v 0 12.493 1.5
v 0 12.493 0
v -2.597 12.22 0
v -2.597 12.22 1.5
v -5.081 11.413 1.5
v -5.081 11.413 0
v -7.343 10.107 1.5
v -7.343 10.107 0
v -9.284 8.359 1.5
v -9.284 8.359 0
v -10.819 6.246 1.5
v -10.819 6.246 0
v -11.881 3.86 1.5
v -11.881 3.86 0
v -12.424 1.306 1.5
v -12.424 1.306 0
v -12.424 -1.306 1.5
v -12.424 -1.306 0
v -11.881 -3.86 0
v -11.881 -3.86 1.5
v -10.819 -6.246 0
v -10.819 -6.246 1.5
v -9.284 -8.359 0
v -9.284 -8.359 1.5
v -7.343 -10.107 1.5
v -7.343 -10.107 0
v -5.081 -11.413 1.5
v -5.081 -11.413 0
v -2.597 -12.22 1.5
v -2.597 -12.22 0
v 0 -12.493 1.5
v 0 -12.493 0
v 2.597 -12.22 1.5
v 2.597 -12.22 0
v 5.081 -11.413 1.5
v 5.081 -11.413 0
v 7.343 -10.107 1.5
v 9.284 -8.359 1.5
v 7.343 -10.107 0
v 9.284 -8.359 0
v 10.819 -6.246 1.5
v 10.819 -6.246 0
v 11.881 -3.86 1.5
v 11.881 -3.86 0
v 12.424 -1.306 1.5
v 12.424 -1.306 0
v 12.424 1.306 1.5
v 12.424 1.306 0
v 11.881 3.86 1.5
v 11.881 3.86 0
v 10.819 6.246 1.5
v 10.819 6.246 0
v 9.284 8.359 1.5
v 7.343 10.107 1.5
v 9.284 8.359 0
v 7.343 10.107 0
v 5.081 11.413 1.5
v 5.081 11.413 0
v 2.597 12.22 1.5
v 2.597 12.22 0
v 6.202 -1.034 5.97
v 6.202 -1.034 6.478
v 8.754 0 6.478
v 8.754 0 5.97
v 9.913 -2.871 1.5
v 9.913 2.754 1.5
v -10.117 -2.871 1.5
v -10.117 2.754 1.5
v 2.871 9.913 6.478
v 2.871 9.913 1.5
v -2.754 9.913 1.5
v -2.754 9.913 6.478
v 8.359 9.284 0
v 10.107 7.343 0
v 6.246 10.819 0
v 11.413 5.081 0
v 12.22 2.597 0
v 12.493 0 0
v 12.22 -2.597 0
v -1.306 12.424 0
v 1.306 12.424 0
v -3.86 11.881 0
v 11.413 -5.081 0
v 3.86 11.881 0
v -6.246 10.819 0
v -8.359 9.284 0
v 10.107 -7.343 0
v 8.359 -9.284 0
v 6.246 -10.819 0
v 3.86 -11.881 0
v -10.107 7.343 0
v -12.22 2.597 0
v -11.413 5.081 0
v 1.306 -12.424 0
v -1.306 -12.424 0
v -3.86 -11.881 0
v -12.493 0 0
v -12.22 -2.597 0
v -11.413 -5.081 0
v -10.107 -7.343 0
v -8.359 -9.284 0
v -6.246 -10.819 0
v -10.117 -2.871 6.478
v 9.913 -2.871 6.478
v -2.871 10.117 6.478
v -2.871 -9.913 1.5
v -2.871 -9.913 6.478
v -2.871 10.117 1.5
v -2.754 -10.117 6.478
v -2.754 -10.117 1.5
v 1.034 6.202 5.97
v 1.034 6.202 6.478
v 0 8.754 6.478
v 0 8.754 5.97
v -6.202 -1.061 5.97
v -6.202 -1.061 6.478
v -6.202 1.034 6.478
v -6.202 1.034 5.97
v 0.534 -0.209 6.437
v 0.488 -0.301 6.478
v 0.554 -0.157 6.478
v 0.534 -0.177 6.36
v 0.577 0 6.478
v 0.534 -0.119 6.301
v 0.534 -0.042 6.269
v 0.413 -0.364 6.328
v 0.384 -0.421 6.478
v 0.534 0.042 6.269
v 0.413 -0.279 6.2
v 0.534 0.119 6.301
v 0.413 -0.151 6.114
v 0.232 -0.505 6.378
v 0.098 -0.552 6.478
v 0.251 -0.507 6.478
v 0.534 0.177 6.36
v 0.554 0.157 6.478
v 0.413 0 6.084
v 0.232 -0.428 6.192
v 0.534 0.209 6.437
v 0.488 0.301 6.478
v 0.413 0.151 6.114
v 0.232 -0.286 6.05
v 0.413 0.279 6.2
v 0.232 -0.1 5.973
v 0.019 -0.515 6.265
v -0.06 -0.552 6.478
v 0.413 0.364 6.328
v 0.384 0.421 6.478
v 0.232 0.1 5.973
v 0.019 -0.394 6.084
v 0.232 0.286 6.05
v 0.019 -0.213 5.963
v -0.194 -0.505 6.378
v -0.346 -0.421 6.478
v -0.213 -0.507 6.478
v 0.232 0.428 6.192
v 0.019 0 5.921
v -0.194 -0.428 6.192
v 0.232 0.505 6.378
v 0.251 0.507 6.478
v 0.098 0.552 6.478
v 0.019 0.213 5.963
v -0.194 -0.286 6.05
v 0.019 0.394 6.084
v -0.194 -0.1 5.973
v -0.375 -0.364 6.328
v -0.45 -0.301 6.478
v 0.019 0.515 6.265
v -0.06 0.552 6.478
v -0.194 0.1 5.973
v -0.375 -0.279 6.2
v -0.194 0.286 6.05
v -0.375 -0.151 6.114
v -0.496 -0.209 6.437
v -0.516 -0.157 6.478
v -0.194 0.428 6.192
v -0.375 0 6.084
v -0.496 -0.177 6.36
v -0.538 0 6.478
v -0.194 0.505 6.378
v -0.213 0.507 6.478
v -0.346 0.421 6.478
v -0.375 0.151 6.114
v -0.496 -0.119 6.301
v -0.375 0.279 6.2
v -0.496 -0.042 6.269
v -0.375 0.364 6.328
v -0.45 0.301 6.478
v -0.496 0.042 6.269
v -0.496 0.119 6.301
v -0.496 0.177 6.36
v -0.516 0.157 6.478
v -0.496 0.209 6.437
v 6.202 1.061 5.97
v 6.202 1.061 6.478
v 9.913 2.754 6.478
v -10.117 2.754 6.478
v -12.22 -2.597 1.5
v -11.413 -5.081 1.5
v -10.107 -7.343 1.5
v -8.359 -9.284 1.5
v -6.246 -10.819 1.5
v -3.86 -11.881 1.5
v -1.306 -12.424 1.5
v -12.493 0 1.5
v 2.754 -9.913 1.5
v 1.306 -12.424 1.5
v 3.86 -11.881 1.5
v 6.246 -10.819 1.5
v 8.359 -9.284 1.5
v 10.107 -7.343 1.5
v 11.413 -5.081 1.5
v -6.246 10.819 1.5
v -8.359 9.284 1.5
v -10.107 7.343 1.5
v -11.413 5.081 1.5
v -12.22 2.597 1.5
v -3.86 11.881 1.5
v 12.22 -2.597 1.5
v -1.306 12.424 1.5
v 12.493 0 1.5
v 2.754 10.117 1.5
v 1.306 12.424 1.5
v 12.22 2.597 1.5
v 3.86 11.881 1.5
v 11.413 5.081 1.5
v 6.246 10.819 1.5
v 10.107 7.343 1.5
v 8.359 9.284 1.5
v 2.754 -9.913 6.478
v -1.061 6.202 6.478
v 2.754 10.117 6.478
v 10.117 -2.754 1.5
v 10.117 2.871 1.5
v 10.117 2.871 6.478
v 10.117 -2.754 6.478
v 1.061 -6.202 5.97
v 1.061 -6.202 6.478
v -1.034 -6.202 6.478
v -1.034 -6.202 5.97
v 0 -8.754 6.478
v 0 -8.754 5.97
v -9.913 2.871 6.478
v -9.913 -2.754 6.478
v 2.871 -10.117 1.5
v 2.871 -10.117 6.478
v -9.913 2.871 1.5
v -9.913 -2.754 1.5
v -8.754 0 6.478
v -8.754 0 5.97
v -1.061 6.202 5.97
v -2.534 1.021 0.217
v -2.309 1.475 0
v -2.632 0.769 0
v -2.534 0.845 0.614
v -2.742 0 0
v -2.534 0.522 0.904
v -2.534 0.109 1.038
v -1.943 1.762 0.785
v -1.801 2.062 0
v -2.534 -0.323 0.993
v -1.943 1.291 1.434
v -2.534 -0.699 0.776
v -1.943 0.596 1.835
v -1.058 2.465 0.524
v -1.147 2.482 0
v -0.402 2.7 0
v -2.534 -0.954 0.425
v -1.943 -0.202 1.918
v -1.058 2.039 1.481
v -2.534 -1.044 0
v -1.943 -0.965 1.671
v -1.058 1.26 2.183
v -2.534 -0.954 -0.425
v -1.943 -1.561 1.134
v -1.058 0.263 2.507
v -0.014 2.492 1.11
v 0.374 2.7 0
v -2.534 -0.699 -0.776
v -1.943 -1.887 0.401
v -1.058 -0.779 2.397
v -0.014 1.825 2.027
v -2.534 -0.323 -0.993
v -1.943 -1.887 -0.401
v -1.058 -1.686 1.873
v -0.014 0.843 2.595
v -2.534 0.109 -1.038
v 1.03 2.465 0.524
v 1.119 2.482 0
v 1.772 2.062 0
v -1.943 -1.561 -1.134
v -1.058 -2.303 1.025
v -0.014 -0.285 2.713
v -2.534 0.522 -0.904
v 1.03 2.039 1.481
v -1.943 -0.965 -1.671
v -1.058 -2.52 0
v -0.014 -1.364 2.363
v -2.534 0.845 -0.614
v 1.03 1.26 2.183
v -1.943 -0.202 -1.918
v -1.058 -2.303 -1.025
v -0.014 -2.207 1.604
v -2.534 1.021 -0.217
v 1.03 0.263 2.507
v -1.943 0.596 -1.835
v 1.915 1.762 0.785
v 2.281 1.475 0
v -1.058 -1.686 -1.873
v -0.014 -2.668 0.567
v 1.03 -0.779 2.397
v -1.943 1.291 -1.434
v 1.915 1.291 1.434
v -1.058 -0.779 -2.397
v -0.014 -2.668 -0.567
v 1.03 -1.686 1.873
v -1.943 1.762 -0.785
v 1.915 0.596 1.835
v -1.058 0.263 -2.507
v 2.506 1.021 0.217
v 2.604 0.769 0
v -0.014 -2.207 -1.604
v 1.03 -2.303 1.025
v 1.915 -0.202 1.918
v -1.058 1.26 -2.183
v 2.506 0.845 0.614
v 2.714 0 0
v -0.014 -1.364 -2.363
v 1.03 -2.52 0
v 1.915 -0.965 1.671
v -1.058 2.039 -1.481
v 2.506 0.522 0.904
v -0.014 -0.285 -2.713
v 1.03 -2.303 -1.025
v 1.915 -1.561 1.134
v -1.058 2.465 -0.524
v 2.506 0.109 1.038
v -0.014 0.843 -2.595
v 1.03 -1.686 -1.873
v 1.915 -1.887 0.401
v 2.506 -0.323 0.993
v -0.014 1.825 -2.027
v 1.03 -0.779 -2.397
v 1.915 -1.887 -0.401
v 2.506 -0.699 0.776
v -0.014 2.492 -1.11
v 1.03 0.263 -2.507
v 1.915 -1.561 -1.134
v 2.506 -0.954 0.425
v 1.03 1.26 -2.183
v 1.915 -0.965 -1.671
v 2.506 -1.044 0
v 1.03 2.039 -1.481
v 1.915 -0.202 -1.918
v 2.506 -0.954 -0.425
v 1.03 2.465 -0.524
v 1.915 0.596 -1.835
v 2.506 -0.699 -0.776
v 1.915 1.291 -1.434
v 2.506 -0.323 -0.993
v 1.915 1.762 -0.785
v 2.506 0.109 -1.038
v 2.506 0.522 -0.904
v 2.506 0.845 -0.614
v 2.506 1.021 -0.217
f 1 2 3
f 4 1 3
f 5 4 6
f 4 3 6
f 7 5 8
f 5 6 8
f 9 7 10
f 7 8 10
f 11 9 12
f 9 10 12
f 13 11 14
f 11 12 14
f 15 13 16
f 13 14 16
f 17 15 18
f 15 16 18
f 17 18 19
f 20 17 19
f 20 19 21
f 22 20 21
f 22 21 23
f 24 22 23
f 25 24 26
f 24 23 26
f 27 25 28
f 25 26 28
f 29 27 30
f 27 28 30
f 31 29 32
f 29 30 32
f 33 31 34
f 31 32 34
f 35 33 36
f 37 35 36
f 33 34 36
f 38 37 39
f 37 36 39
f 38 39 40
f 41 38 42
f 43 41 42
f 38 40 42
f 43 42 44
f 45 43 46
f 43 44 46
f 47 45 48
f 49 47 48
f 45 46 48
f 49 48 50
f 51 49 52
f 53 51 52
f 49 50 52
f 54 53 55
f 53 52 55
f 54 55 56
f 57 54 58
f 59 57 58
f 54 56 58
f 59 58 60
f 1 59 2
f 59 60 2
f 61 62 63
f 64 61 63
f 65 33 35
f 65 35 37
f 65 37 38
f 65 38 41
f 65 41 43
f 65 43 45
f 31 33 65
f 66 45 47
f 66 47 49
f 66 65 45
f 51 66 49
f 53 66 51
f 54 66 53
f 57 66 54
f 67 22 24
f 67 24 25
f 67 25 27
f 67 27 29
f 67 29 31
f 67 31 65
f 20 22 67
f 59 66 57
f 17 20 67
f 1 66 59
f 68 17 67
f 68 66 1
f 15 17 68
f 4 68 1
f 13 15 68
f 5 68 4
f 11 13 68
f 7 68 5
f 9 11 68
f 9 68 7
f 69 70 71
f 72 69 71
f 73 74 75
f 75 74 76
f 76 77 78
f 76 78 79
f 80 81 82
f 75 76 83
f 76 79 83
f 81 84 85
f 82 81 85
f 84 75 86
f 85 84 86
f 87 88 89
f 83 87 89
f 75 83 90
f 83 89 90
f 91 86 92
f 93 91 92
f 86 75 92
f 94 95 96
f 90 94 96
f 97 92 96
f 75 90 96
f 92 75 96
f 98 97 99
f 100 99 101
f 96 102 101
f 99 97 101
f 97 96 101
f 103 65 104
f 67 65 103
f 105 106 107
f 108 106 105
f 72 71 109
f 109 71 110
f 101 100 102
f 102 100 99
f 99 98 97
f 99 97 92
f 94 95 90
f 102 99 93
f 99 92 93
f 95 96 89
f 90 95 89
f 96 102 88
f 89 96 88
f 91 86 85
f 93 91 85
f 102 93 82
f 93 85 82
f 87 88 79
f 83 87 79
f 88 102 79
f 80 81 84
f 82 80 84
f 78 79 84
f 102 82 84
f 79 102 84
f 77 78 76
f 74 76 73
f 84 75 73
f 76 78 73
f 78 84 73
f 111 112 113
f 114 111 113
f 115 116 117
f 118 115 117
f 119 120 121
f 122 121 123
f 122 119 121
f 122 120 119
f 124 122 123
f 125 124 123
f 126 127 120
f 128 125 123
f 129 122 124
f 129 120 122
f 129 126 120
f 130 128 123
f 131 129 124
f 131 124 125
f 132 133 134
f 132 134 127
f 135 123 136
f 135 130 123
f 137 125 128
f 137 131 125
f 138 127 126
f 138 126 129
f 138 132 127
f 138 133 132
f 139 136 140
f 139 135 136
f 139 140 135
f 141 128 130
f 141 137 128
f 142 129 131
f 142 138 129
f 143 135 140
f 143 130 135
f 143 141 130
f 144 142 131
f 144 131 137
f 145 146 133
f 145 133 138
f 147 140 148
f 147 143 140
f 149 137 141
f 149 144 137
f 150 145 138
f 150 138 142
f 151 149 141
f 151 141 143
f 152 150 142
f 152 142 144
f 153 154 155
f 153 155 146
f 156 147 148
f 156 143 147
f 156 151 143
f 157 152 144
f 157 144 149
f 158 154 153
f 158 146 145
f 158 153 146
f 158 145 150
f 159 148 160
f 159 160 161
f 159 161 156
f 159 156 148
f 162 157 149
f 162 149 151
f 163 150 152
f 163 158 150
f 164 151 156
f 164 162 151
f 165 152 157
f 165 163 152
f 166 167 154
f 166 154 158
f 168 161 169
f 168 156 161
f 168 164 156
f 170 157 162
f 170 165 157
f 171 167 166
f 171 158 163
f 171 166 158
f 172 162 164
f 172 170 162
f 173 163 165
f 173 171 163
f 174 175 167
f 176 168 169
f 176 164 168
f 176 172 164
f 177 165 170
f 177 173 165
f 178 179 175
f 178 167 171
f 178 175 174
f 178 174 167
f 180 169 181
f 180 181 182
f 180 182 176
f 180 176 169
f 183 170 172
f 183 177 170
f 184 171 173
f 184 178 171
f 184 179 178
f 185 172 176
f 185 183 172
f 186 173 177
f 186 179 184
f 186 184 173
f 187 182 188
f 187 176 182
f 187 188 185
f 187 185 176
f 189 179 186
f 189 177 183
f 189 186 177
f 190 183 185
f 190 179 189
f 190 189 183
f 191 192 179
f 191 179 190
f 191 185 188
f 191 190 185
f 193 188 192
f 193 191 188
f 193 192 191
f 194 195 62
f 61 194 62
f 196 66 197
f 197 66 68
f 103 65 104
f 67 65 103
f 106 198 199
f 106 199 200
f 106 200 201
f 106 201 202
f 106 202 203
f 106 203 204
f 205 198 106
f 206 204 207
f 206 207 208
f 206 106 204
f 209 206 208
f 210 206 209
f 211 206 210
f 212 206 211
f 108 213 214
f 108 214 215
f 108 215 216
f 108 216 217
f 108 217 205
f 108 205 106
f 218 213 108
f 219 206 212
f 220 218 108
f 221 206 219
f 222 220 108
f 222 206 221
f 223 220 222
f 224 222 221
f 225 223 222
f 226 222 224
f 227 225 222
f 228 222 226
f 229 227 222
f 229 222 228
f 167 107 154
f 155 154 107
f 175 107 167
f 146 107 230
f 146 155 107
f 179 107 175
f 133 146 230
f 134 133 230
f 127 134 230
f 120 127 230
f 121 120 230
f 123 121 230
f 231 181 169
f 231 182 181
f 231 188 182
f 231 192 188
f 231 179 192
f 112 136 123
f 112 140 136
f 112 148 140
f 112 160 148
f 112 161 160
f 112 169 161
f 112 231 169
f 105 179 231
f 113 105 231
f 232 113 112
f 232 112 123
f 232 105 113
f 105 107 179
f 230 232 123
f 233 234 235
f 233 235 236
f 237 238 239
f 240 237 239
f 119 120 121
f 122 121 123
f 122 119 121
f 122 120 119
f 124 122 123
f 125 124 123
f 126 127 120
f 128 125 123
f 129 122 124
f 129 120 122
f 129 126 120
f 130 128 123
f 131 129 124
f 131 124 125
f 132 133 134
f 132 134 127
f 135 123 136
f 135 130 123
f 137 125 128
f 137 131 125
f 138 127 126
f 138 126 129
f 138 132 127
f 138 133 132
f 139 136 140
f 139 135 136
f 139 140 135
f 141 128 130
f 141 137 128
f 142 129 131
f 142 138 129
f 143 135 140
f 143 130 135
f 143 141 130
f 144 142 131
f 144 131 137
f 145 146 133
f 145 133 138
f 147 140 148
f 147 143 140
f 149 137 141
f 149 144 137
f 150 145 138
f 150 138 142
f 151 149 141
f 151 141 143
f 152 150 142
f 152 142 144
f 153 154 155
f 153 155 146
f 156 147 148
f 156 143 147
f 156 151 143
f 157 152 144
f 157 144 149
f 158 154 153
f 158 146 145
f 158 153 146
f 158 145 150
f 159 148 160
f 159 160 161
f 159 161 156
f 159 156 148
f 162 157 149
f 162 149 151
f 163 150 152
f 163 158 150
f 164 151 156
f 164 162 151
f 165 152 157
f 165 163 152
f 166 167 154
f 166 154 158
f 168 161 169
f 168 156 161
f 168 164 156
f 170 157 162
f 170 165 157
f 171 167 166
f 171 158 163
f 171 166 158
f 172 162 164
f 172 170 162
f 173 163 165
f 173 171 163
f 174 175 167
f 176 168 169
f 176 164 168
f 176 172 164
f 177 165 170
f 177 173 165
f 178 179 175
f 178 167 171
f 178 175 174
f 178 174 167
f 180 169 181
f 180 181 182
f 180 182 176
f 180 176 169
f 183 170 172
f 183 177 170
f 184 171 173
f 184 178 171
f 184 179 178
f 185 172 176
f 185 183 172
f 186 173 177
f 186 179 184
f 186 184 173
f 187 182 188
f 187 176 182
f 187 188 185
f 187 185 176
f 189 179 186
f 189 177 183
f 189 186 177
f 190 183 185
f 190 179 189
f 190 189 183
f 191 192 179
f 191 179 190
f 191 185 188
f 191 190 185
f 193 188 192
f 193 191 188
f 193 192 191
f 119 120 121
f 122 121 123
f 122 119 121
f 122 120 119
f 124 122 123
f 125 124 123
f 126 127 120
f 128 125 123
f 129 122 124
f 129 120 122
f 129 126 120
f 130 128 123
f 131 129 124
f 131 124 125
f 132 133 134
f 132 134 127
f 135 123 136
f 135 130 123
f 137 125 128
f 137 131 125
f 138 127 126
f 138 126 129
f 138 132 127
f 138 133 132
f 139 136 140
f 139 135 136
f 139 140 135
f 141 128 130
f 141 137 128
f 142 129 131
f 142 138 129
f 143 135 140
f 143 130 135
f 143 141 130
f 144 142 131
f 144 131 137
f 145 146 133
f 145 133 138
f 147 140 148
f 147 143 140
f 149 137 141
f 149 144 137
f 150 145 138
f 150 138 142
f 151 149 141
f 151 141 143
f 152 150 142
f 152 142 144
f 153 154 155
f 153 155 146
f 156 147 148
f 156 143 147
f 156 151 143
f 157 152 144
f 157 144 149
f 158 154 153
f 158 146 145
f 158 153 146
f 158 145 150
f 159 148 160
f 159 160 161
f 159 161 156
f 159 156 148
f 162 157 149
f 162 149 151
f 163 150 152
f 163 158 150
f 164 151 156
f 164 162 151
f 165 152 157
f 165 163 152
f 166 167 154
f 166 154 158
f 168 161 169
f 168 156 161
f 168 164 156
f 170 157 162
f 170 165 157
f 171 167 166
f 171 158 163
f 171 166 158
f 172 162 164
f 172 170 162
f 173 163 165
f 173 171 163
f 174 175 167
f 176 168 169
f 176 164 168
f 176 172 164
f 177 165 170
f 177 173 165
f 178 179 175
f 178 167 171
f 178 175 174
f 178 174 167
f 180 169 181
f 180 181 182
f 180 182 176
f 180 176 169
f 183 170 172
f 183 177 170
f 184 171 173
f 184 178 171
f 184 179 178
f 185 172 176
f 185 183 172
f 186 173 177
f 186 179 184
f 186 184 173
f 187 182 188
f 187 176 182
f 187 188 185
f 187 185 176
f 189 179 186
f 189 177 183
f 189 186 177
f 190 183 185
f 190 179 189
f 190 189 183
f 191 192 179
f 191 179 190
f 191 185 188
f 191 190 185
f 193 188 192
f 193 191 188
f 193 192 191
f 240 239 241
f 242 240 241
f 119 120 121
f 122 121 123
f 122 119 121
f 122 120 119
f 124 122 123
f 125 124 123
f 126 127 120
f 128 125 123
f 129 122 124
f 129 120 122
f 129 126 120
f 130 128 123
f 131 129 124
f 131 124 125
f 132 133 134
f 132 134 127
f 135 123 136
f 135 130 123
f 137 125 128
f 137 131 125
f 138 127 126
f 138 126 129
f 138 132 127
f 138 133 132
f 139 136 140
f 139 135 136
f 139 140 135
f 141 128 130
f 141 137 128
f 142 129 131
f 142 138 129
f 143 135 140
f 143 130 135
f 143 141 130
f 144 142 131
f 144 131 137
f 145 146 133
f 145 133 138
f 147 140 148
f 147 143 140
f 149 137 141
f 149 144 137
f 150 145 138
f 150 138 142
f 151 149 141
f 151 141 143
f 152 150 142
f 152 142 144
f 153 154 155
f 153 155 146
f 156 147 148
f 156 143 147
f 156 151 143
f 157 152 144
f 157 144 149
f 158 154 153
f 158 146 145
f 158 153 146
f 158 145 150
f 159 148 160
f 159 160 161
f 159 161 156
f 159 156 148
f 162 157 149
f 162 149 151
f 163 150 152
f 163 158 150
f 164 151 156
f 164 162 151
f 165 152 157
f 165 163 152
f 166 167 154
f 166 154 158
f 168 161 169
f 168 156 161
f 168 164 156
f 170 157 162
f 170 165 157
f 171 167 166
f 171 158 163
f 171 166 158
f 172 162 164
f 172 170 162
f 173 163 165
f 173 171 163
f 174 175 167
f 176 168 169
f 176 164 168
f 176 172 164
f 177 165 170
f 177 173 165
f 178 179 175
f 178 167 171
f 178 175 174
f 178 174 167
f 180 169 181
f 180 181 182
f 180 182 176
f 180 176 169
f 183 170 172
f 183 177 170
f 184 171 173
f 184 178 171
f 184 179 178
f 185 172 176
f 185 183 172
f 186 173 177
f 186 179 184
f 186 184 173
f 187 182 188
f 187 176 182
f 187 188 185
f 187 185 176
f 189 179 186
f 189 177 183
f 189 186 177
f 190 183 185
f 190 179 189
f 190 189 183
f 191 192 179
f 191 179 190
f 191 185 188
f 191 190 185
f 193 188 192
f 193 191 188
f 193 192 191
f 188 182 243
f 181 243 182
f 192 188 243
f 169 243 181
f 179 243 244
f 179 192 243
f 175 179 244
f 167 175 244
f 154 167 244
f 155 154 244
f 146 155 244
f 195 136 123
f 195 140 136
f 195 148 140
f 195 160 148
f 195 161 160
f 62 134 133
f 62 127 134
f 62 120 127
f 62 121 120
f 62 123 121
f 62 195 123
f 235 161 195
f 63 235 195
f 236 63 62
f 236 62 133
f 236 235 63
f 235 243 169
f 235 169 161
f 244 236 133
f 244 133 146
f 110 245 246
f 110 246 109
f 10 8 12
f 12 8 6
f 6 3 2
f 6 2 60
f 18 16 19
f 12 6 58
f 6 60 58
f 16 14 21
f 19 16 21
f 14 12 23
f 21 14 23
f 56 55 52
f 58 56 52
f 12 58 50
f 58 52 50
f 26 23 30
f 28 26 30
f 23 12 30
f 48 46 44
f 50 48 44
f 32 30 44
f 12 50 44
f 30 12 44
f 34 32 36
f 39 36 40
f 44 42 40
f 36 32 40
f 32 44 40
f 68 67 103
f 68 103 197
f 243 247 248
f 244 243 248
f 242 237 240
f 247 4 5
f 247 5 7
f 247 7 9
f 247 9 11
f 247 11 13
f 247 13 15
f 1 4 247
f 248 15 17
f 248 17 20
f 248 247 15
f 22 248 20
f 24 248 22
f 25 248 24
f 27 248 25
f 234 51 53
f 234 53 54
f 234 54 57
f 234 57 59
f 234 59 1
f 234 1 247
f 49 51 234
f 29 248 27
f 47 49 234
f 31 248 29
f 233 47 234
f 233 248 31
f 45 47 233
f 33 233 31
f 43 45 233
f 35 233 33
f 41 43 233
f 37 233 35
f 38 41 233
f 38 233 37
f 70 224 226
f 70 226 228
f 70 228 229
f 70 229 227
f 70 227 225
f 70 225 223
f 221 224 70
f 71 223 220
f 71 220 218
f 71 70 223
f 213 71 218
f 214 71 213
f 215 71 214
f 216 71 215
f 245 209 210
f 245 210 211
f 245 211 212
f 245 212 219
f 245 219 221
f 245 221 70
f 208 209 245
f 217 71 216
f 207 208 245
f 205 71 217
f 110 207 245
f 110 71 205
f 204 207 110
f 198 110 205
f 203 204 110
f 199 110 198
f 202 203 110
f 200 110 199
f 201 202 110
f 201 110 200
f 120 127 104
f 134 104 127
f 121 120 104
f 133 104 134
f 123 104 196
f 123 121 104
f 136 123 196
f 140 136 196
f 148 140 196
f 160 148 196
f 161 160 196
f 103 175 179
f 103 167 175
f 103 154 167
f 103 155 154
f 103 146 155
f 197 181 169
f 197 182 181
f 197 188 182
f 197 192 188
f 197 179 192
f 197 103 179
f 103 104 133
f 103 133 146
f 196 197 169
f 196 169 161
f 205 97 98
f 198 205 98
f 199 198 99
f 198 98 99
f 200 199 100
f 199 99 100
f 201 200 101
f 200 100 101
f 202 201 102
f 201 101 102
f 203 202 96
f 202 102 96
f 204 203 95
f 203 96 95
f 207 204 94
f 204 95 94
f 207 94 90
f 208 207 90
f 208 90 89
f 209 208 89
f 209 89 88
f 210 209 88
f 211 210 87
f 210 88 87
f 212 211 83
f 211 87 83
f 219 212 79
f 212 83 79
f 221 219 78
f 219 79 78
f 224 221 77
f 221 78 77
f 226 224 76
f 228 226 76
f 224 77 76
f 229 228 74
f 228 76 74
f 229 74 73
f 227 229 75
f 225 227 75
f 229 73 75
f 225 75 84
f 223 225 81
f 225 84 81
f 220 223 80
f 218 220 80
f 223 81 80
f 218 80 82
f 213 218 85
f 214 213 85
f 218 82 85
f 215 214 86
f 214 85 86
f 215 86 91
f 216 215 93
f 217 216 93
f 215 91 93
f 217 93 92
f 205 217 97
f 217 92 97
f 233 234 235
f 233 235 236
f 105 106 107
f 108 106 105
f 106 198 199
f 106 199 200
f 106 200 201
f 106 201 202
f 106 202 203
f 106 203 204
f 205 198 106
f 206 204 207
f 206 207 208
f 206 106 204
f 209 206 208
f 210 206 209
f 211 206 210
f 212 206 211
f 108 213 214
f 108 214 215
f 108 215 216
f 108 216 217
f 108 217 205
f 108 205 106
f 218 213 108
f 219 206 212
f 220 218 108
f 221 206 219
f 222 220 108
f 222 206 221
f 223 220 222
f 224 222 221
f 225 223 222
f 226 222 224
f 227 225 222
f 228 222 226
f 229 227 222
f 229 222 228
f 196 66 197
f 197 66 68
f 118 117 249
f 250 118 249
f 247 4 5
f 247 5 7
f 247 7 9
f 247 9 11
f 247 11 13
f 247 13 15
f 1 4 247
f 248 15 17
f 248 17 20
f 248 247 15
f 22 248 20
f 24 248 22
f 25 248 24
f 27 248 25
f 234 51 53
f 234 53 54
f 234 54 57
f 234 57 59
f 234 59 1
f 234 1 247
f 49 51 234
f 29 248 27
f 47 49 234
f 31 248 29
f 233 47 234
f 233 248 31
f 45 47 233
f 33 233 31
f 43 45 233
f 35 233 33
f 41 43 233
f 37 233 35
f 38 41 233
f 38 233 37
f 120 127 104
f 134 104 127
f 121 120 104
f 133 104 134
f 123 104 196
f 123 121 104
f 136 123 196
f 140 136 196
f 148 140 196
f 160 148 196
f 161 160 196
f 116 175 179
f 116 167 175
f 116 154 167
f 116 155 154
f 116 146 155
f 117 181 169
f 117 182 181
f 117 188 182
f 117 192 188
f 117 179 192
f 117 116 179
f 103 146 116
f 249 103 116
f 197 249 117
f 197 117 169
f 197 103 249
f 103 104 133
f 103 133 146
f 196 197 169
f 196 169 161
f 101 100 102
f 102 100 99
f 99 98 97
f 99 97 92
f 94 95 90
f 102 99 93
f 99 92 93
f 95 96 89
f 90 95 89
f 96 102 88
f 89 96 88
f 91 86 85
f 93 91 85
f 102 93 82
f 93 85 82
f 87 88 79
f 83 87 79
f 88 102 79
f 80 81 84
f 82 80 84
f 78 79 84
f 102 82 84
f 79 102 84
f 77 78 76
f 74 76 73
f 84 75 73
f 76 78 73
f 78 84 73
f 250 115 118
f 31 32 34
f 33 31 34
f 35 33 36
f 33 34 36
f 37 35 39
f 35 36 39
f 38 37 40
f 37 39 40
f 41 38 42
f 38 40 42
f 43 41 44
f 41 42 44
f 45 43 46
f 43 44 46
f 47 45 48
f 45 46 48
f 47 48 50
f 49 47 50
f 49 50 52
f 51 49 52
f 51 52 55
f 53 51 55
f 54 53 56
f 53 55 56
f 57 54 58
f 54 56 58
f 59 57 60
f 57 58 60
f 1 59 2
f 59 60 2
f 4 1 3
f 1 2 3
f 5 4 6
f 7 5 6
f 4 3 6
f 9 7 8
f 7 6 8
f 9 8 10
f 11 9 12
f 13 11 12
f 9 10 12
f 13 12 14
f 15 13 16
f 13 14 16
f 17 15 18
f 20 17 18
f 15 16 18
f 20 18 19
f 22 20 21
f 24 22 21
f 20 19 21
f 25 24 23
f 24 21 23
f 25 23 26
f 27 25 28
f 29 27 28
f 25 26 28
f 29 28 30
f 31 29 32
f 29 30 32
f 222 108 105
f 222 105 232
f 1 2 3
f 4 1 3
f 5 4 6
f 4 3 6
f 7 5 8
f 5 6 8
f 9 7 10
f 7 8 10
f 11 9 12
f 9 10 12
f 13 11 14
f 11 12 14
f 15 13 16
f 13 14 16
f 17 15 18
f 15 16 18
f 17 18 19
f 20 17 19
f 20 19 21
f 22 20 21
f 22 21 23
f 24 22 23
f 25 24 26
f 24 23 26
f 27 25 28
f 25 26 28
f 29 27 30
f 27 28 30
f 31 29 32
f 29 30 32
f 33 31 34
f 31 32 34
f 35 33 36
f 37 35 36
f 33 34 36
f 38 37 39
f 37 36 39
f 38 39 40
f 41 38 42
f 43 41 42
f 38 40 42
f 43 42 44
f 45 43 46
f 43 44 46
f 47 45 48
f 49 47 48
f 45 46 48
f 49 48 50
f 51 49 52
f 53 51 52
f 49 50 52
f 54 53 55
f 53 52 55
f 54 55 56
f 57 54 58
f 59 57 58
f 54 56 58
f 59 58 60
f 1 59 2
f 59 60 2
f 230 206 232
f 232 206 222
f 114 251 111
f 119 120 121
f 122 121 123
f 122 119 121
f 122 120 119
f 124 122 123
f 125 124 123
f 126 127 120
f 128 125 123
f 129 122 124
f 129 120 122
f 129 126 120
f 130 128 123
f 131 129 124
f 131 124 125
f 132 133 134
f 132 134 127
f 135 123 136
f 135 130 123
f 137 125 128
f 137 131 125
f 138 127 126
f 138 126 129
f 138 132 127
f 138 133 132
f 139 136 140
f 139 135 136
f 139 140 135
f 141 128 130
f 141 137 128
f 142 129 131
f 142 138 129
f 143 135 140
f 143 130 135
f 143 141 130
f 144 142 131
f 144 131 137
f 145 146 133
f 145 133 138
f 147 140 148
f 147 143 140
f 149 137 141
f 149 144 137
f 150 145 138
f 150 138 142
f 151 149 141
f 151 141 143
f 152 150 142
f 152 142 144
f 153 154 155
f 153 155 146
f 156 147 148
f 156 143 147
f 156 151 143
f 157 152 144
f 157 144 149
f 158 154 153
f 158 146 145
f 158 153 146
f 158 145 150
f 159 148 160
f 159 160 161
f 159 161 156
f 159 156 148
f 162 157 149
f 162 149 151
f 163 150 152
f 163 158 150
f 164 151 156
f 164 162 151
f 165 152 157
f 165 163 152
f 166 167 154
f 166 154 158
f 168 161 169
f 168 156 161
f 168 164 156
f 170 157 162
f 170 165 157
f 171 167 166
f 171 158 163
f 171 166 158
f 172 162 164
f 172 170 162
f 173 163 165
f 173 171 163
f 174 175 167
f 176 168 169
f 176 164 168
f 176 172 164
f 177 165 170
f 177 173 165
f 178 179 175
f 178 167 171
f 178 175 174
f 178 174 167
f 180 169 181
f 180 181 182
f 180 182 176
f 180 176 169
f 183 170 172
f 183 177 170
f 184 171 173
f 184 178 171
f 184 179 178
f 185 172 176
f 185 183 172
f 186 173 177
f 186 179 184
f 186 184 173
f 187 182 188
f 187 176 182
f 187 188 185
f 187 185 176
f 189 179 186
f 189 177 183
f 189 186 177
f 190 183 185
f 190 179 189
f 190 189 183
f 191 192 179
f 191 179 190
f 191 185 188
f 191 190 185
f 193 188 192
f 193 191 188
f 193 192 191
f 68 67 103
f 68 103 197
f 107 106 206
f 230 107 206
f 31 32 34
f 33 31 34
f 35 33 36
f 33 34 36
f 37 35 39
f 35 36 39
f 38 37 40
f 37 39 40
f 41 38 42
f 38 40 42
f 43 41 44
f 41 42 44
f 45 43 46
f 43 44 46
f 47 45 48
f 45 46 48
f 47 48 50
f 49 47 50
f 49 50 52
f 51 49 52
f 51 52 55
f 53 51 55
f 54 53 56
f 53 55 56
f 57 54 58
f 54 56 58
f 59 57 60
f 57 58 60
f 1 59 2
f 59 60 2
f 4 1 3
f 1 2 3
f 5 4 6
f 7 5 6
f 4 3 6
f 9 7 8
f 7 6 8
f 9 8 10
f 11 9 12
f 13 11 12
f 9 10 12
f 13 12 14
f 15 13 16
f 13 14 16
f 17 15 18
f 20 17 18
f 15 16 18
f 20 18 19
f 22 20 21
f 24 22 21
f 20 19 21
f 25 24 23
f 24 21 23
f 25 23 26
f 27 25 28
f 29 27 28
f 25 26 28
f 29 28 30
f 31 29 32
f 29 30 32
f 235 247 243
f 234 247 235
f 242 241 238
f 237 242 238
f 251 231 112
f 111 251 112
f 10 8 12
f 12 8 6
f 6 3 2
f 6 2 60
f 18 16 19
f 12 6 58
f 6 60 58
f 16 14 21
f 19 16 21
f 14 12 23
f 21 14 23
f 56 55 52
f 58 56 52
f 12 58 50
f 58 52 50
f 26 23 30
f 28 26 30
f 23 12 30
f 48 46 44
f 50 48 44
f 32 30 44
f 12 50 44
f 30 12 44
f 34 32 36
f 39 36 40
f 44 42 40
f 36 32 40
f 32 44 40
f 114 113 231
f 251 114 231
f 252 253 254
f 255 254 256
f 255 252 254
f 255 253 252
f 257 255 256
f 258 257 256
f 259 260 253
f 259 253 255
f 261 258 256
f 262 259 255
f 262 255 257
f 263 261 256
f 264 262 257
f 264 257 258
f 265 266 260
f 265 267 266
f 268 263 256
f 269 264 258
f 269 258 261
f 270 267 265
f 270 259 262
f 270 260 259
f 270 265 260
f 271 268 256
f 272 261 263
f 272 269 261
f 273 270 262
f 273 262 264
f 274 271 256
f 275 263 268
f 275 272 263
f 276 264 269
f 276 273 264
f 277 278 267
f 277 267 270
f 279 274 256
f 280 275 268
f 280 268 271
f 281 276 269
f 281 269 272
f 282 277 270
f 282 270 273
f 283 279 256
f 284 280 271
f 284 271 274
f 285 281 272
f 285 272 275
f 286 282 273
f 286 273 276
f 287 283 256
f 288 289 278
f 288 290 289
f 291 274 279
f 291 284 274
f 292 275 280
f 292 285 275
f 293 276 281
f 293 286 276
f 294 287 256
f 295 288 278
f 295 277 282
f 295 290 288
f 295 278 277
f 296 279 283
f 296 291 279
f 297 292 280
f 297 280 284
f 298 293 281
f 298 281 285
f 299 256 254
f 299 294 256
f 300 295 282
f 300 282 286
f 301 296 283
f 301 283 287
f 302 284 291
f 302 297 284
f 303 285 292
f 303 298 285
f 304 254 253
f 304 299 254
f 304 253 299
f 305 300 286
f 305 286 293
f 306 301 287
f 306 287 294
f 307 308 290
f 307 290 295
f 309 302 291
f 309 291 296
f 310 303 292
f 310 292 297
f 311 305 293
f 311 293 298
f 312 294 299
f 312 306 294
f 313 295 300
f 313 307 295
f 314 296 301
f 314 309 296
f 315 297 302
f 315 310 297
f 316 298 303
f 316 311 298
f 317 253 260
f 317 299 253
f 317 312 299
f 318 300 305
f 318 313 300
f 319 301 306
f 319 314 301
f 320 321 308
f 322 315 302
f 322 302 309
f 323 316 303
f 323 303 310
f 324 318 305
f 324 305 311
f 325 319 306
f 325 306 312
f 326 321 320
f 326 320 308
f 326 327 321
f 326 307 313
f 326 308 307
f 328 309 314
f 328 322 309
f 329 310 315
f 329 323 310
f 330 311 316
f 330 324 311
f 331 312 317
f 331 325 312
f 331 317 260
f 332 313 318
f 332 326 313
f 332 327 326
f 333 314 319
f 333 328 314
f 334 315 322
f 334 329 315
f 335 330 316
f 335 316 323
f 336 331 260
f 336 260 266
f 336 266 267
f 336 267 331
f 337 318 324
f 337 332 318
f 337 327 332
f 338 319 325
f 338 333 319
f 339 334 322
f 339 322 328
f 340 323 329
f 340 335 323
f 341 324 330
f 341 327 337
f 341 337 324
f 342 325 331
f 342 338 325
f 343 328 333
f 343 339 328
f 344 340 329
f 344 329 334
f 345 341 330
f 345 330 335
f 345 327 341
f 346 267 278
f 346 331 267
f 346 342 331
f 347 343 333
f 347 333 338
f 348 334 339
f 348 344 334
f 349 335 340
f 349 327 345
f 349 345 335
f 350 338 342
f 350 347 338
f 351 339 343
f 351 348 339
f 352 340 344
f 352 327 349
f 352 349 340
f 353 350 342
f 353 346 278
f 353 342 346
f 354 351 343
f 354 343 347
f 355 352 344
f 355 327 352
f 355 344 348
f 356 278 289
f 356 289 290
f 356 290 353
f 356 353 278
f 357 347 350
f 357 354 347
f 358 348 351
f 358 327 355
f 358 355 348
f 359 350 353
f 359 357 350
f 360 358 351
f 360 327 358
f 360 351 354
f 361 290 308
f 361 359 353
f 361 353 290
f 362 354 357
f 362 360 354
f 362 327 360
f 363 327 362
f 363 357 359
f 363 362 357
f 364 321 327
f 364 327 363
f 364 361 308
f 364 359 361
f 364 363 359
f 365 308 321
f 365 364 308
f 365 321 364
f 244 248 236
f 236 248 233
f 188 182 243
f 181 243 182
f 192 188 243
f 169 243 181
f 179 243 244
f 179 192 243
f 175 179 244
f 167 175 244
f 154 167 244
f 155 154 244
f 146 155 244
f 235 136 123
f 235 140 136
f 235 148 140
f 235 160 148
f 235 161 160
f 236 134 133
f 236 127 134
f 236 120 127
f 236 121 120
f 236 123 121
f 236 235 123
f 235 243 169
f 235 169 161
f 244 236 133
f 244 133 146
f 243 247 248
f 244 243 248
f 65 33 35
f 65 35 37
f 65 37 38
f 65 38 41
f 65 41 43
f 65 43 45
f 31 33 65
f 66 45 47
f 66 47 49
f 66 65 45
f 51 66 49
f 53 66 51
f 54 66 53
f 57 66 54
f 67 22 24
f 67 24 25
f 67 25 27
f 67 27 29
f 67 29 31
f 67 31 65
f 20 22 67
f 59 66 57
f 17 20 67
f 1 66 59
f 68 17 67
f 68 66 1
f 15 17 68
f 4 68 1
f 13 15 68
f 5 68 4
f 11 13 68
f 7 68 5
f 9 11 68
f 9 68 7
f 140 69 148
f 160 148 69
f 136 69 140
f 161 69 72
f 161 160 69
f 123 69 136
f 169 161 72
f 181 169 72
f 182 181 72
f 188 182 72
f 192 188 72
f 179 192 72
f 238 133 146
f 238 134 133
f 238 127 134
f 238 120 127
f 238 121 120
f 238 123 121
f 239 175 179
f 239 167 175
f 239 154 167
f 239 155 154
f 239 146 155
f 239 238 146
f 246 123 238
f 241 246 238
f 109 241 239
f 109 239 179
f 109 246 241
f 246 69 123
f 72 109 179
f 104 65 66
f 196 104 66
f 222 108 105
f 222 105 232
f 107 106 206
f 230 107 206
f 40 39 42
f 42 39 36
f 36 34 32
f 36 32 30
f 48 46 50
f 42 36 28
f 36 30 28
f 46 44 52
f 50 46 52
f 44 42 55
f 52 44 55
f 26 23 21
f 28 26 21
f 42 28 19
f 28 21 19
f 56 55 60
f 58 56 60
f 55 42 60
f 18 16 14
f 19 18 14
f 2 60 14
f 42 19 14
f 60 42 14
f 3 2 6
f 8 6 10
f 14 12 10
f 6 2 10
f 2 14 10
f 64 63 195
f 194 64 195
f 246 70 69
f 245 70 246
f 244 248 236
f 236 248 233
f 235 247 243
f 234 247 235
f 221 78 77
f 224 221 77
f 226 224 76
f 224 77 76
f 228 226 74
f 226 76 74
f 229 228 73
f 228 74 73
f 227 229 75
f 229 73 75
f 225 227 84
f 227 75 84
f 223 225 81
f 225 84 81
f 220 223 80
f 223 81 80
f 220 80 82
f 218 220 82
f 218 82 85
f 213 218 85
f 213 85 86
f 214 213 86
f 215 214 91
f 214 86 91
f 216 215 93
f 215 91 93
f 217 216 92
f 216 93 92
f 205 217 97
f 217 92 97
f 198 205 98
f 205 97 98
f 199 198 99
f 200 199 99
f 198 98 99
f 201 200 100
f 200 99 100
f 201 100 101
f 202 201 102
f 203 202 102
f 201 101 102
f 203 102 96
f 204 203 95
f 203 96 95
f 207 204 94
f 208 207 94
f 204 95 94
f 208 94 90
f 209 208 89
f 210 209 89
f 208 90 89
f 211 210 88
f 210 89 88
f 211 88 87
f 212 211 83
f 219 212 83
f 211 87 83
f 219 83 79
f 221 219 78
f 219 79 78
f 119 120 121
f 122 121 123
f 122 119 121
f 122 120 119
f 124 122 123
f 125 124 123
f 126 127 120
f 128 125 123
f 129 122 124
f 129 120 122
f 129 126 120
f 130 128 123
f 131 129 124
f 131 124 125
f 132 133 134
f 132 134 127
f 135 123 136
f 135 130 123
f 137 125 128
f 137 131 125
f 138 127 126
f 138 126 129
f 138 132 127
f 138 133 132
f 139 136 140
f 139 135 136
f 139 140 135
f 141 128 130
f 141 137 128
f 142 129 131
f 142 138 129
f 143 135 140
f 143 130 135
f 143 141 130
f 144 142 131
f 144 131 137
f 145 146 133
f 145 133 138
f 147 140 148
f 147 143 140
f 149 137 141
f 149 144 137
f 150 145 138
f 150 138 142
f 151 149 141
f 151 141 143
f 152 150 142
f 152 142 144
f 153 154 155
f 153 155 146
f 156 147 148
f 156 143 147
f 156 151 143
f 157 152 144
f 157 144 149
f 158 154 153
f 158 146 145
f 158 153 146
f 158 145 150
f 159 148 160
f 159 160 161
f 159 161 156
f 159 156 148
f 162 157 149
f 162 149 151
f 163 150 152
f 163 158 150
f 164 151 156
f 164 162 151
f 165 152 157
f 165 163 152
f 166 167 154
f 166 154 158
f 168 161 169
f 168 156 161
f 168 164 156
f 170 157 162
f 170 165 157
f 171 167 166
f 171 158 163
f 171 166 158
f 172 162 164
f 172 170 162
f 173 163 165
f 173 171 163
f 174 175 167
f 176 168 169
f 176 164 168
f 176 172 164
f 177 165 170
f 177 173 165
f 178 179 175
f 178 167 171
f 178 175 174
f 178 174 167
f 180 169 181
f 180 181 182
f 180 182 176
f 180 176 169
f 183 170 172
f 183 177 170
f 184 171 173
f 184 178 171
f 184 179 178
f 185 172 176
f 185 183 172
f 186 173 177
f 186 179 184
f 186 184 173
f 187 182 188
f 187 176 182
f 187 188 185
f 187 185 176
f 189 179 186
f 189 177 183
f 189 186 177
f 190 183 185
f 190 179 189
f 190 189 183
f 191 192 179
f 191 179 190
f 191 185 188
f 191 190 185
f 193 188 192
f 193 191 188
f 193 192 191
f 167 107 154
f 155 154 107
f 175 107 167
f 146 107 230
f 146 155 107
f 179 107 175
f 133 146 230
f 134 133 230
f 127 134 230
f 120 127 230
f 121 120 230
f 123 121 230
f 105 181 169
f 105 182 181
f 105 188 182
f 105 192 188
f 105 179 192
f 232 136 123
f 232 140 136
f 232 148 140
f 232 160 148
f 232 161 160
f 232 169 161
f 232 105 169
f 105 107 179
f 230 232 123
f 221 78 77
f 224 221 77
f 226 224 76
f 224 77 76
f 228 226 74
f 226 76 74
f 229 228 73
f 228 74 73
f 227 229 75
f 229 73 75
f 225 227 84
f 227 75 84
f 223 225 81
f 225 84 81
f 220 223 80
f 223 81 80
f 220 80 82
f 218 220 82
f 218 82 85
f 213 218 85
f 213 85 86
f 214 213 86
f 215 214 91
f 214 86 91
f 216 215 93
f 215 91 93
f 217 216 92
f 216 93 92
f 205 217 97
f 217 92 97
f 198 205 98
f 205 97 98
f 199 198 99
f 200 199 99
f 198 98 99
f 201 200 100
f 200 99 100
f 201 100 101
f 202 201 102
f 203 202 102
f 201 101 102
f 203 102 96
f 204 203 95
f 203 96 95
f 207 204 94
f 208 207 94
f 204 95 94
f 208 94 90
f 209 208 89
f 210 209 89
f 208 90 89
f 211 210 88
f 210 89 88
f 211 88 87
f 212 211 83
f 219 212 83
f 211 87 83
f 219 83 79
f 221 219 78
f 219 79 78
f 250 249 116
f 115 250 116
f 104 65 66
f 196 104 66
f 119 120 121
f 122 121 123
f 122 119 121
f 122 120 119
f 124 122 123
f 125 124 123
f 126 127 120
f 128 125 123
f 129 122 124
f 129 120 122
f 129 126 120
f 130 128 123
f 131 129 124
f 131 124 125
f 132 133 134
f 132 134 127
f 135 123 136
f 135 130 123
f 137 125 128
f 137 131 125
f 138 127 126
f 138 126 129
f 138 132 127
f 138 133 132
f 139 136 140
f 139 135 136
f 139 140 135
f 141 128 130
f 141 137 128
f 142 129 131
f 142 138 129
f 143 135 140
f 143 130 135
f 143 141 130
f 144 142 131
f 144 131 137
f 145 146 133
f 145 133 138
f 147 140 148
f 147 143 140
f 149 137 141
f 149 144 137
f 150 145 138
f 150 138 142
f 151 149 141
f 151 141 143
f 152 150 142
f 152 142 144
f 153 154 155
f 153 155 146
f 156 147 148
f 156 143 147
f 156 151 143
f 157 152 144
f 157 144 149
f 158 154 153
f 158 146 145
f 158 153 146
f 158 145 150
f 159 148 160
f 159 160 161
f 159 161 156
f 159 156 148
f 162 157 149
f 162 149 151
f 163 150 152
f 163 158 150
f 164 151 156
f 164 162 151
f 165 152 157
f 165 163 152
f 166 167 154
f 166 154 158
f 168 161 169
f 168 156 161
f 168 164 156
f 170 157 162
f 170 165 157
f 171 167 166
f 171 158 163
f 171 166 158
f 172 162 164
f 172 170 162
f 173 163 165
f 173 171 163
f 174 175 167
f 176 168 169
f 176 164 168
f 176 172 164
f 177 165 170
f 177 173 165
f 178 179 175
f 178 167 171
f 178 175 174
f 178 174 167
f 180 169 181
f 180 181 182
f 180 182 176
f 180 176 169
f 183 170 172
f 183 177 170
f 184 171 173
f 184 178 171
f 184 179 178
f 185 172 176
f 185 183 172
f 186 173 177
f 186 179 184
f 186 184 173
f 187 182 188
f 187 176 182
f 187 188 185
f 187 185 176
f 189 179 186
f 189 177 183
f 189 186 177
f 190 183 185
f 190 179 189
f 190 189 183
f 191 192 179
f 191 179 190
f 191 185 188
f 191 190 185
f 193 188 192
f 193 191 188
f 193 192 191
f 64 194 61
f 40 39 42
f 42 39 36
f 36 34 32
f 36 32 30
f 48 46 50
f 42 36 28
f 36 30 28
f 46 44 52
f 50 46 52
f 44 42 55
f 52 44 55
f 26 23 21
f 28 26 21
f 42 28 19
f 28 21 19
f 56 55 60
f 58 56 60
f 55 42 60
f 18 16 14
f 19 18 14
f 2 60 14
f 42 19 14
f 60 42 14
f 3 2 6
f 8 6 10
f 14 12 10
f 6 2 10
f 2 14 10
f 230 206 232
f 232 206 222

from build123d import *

# Parameters (mm, degrees)
F0_R     = 12.4925376122
F1_DEPTH = 1.49999954
F2_W     = 5.6254547089
F2_H     = 20.0294479728
F3_DEPTH = 4.9784
F4_ANGLE = 90
F6_DEPTH = 0.508
F7_ANGLE = 90
F8_ANGLE = 180
F9_ANGLE = 270


with BuildPart() as f1:
    # F0 (on Top) → F1 (new body)
    with BuildSketch(Plane.XY):
        Circle(F0_R)
    extrude(amount=F1_DEPTH)

    # F2 (on face) → F3 (join)
    with BuildSketch(Plane.XY.offset(1.49999954)):
        with Locations((-0.0586905517, 0.1018550247)):
            Rectangle(F2_W, F2_H)
    extrude(amount=F3_DEPTH)


with BuildPart() as f4_1:
    # F4: copy of F1
    add(f1.part.rotate(Axis((0, 0, 1.49999954), (0, 0, 1)), F4_ANGLE))


with BuildPart() as f1_1:
    add(f1.part)

    # F5 (on face) → F6 (cut)
    with BuildSketch(Plane.XY.offset(6.47839954)):
        Polygon((1.0343084128, 6.2022455968), (0, 8.7543390691), (-1.060815071, 6.2022455968), align=None)
    extrude(amount=-F6_DEPTH, mode=Mode.SUBTRACT)


with BuildPart() as f7_1:
    # F7: copy of F1
    add(f1_1.part.rotate(Axis((0, 0, 1.49999954), (0, 0, 1)), F7_ANGLE))


with BuildPart() as f8_1:
    # F8: copy of F1
    add(f1_1.part.rotate(Axis((0, 0, 1.49999954), (0, 0, 1)), F8_ANGLE))


with BuildPart() as f8_2:
    # F8: copy of F4_1
    add(f4_1.part.rotate(Axis((0, 0, 1.49999954), (0, 0, 1)), F8_ANGLE))


with BuildPart() as f9_1:
    # F9: copy of F4_1
    add(f4_1.part.rotate(Axis((0, 0, 1.49999954), (0, 0, 1)), F9_ANGLE))


with BuildPart() as f9_2:
    # F9: copy of F1
    add(f1_1.part.rotate(Axis((0, 0, 1.49999954), (0, 0, 1)), F9_ANGLE))


with BuildPart() as f11:
    # F10 (on face) → F11 (revolve)
    with BuildSketch(Plane(origin=(0, 0, 0), x_dir=(1, 0, 0), z_dir=(0, 0, -1))):
        with BuildLine():
            Line((2.7140288148, 0), (-2.7421168052, 0))
            ThreePointArc((-2.7421168052, 0), (-0.0140439952, -2.72807281), (2.7140288148, 0))
        make_face()
    revolve(axis=Axis((0.2995932009, 0, 0), (1, 0, 0)))


with BuildPart() as f13_tool:
    # F12 (on face) → F13 (revolve)
    with BuildSketch(Plane.XY.offset(6.47839954)):
        with BuildLine():
            Line((-0.5384656251, 0), (0.5765479291, 0))
            ThreePointArc((0.5765479291, 0), (0.019041152, 0.5575067771), (-0.5384656251, 0))
        make_face()
    revolve(axis=Axis((0.0574899605, 0, 6.47839954), (1, 0, 0)))


with BuildPart() as f1_2:
    add(f1_1.part)

    # F13: cut by f13_tool
    add(f13_tool.part, mode=Mode.SUBTRACT)


with BuildPart() as f4_1_1:
    add(f4_1.part)

    # F13: cut by f13_tool
    add(f13_tool.part, mode=Mode.SUBTRACT)


with BuildPart() as f7_1_1:
    add(f7_1.part)

    # F13: cut by f13_tool
    add(f13_tool.part, mode=Mode.SUBTRACT)


with BuildPart() as f8_1_1:
    add(f8_1.part)

    # F13: cut by f13_tool
    add(f13_tool.part, mode=Mode.SUBTRACT)


with BuildPart() as f8_2_1:
    add(f8_2.part)

    # F13: cut by f13_tool
    add(f13_tool.part, mode=Mode.SUBTRACT)


with BuildPart() as f9_1_1:
    add(f9_1.part)

    # F13: cut by f13_tool
    add(f13_tool.part, mode=Mode.SUBTRACT)


with BuildPart() as f9_2_1:
    add(f9_2.part)

    # F13: cut by f13_tool
    add(f13_tool.part, mode=Mode.SUBTRACT)


solid = Compound([f11.part, f1_2.part, f4_1_1.part, f7_1_1.part, f8_1_1.part, f8_2_1.part, f9_1_1.part, f9_2_1.part])
